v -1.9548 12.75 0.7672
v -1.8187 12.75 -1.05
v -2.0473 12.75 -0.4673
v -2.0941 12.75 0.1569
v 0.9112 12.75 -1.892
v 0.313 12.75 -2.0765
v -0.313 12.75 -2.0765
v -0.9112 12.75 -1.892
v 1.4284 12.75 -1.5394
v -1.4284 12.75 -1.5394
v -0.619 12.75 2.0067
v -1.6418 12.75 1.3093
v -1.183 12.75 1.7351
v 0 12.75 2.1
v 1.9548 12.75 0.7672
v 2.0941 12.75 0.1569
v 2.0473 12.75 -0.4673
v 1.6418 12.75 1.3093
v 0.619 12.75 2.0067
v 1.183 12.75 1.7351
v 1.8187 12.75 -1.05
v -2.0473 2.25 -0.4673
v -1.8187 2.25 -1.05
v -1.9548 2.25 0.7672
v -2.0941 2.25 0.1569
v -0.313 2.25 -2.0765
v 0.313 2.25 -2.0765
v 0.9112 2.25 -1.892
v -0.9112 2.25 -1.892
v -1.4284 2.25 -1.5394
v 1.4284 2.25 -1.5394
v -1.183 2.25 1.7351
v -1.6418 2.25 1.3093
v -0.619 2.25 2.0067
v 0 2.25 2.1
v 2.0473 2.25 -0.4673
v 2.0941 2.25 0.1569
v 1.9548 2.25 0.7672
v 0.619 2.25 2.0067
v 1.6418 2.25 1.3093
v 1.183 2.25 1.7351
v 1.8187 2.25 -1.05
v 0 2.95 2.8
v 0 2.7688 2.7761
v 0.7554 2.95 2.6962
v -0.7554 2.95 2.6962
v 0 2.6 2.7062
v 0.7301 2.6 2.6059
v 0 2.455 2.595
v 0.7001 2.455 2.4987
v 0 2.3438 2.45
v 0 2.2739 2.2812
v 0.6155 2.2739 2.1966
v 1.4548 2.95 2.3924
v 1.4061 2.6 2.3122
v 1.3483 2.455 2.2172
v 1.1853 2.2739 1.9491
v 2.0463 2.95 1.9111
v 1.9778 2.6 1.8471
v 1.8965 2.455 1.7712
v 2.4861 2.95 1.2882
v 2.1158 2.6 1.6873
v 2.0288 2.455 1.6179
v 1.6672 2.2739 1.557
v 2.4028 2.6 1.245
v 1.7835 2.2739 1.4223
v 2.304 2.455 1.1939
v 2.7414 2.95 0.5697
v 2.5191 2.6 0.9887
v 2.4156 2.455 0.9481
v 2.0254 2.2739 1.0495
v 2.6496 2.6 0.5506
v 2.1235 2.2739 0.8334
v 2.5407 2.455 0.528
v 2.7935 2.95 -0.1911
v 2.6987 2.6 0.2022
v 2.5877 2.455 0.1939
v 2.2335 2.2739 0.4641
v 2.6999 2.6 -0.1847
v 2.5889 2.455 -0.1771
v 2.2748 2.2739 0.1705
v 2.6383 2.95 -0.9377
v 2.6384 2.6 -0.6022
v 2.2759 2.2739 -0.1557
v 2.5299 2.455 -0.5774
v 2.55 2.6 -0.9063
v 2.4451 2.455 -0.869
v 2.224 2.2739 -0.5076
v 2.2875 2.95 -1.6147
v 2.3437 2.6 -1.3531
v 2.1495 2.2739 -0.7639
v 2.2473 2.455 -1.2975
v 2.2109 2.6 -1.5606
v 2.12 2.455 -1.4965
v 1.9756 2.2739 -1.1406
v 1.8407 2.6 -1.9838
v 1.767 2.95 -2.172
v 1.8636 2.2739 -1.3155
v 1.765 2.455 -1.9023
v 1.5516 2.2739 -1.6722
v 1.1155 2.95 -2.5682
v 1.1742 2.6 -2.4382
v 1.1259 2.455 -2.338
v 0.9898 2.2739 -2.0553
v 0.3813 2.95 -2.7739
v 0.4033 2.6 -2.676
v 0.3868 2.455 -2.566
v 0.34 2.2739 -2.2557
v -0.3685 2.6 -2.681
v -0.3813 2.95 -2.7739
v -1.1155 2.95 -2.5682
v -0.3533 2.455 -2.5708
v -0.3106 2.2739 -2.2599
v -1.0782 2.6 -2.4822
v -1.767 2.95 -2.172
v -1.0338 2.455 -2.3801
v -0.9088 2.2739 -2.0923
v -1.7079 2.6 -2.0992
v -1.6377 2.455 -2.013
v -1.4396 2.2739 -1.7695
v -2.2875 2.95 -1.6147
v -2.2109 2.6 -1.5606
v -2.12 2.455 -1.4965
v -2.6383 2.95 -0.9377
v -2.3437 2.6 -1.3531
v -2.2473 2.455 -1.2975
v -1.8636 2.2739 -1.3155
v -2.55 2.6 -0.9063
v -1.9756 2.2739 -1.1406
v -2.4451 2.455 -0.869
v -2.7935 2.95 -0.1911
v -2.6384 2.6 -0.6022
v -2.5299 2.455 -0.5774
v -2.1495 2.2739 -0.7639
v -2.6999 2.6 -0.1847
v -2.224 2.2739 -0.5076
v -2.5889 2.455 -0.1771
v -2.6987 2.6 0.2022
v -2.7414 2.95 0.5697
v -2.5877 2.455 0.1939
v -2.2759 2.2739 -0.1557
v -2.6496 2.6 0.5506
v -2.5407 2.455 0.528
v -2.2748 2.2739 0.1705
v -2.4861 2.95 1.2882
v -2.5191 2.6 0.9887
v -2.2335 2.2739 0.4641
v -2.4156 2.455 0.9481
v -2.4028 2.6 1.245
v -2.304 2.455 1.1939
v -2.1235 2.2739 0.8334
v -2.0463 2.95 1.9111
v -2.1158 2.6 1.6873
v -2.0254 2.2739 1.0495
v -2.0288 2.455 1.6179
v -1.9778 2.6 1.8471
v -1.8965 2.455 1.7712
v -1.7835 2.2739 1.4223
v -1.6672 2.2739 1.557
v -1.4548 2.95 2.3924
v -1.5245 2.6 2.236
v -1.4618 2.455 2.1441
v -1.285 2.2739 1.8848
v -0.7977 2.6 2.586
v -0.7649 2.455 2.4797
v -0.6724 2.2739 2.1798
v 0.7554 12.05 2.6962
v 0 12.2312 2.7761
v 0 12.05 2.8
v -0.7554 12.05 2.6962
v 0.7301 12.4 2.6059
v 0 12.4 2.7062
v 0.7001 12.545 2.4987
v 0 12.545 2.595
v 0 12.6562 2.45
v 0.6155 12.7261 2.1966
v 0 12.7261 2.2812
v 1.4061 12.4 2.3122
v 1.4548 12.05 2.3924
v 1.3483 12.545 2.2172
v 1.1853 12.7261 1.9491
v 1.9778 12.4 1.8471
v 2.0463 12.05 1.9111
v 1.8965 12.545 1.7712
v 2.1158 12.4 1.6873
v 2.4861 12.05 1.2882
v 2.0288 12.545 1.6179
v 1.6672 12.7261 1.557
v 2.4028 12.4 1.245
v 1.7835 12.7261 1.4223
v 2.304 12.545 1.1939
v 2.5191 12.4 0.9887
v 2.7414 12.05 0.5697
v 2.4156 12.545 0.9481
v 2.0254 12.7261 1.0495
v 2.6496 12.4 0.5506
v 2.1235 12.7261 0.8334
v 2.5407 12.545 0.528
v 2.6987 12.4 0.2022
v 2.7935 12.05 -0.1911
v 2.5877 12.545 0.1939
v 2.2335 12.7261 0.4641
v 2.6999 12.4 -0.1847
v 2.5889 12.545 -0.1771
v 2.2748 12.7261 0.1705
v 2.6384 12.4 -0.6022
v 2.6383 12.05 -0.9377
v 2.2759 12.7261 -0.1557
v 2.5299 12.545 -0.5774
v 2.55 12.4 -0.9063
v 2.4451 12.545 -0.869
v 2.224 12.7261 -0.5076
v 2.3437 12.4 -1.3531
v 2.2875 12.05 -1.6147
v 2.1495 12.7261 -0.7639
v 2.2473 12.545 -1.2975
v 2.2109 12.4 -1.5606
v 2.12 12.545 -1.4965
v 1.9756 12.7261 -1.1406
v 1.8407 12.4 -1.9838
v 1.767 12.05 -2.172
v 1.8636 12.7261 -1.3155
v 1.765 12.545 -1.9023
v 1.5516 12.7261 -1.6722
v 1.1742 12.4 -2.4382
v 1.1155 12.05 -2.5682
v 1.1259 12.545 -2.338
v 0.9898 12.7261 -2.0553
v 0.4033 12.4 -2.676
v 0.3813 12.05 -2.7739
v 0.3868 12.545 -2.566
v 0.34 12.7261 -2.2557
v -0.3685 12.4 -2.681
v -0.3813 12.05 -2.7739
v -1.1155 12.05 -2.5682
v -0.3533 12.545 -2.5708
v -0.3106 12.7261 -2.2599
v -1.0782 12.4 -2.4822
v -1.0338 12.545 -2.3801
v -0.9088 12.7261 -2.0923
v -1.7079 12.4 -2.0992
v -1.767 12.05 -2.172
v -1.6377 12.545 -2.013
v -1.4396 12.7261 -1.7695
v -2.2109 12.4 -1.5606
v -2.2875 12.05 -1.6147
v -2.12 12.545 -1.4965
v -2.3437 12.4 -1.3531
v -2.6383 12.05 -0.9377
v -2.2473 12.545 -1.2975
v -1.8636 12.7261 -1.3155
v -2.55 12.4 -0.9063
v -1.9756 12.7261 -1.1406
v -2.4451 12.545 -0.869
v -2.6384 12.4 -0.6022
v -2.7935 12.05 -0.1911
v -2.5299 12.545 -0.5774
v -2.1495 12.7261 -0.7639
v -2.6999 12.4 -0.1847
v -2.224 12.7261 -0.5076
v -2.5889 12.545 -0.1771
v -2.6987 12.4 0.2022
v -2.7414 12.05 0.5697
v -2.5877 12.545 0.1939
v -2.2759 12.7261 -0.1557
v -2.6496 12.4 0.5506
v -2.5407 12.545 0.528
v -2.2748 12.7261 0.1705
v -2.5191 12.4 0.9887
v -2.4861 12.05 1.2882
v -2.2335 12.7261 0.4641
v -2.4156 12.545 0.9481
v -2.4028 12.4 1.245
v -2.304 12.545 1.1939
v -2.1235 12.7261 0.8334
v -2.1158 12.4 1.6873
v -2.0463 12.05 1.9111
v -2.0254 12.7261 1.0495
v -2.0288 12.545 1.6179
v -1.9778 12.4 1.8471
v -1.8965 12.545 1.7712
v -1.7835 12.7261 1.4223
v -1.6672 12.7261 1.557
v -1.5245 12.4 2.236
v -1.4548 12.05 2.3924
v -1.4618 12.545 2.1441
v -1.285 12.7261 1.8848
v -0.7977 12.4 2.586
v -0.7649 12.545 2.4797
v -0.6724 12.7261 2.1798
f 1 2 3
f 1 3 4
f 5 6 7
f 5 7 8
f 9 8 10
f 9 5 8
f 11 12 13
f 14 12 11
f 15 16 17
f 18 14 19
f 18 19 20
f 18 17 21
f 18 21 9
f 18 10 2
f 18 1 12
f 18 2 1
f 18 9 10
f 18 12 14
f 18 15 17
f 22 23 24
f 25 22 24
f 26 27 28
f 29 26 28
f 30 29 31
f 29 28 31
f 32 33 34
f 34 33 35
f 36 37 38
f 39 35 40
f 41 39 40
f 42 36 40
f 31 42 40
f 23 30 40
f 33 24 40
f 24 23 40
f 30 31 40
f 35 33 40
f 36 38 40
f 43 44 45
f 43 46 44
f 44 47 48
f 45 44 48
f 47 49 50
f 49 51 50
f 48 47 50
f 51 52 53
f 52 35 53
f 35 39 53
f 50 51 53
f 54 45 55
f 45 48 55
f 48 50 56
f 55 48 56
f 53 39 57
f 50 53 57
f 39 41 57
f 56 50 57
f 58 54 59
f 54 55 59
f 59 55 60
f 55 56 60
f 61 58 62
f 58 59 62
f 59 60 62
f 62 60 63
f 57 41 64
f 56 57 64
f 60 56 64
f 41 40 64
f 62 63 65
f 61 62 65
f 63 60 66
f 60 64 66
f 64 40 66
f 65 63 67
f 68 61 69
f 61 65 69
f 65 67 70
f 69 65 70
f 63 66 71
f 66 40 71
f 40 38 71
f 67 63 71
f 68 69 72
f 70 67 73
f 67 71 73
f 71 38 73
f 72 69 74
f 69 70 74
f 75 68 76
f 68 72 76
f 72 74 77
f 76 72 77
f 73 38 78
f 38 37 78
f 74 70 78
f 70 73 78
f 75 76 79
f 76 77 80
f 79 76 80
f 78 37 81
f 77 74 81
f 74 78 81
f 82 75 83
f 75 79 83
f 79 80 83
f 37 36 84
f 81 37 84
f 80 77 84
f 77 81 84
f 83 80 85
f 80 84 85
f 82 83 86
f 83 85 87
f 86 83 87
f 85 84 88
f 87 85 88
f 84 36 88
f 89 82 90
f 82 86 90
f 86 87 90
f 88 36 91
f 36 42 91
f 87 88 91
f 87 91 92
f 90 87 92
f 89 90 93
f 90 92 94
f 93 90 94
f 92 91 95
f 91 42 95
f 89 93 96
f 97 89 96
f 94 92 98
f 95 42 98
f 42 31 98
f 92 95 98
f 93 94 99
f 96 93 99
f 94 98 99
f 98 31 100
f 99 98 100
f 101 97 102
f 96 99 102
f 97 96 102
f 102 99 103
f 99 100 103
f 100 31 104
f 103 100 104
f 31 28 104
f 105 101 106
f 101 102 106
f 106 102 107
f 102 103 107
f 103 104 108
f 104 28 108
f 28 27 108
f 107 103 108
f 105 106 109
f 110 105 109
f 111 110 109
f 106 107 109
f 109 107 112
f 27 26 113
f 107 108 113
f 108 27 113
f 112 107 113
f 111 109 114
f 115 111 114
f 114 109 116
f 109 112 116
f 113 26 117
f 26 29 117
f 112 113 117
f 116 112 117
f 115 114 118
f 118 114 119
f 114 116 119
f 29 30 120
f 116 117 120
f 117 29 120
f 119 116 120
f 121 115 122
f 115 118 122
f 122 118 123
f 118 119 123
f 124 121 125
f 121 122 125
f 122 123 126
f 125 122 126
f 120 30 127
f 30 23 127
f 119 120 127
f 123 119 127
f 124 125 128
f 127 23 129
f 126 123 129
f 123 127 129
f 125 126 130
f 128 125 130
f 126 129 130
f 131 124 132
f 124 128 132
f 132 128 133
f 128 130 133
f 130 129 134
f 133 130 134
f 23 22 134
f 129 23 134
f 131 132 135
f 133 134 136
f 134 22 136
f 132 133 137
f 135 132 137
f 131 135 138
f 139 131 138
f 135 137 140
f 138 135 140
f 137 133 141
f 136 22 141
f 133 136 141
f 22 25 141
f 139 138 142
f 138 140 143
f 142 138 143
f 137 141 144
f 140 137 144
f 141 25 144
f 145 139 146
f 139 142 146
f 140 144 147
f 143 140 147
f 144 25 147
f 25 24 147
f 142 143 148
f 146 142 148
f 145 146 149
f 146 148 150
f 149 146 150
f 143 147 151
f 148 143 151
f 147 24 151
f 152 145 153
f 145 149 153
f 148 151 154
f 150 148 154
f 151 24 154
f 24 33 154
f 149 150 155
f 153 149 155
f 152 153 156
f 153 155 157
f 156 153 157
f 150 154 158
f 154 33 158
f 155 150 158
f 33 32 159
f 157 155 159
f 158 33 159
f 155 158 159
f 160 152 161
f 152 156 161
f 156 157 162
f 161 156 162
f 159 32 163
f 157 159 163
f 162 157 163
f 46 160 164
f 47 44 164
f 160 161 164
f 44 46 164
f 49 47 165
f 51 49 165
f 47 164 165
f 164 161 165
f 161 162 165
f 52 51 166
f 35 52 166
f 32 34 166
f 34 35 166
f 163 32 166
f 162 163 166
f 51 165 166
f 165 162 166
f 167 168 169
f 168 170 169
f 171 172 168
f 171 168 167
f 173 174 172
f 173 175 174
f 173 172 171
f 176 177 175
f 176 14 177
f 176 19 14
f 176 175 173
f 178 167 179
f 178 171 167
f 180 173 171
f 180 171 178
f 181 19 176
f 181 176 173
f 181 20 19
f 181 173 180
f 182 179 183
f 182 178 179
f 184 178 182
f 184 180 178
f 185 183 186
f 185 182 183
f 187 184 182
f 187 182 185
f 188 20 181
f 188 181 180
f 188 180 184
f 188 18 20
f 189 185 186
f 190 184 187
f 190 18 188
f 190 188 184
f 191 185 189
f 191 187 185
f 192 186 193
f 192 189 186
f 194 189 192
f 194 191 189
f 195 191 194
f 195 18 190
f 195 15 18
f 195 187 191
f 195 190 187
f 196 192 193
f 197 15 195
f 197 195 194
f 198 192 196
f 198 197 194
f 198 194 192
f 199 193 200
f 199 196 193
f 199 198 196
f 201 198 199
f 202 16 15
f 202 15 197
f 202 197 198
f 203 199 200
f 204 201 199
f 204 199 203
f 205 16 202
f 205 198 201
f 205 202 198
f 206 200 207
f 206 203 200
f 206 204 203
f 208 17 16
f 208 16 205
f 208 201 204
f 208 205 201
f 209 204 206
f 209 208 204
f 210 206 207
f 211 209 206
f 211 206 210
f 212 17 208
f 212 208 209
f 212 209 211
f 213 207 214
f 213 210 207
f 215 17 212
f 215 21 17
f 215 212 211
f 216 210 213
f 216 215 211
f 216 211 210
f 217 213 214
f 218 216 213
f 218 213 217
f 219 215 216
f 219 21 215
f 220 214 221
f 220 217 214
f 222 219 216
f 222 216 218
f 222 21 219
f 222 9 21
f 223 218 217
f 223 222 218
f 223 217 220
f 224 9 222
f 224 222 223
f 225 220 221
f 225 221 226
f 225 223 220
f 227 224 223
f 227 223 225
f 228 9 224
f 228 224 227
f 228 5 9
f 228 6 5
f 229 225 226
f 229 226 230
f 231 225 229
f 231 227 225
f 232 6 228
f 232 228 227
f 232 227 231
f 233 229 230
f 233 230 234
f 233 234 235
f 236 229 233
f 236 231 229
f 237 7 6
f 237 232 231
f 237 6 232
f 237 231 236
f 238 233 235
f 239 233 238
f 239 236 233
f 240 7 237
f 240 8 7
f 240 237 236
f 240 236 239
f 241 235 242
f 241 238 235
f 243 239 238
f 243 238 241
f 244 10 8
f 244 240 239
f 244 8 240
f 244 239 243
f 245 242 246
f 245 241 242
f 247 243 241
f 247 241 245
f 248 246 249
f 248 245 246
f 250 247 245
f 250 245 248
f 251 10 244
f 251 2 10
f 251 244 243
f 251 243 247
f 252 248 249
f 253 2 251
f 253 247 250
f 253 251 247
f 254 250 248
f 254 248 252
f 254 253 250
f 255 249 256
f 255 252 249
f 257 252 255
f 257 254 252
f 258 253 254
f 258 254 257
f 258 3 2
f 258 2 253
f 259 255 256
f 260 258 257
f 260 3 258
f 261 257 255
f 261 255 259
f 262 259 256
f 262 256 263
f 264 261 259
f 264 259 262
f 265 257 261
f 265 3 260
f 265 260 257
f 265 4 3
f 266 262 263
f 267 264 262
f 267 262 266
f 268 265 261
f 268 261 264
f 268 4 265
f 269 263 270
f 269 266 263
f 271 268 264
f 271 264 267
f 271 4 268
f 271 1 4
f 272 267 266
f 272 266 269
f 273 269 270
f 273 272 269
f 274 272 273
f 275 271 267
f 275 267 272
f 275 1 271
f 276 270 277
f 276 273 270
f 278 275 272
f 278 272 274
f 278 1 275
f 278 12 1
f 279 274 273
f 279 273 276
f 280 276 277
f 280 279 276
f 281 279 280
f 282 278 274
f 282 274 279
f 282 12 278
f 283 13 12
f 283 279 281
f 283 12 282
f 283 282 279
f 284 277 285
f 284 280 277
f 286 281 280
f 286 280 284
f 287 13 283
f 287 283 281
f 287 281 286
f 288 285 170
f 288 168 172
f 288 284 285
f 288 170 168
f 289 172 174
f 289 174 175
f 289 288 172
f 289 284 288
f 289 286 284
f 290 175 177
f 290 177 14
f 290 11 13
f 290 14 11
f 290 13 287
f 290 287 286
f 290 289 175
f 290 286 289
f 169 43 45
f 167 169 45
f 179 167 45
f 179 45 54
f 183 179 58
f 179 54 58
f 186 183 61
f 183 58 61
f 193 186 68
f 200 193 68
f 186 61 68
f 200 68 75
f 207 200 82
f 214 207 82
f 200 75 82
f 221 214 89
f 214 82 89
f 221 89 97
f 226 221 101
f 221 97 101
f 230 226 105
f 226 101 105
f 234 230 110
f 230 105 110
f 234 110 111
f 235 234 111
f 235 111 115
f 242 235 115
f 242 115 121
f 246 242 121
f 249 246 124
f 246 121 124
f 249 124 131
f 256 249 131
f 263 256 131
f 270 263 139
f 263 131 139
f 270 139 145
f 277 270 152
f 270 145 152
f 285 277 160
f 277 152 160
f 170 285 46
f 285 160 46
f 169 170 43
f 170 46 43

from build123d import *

# Parameters (mm, degrees)
SKETCH1_R           = 4
BOSS_EXTRUDE1_DEPTH = 15
FILLET1_R           = 1
SCALE1_SCALE        = 0.7


with BuildPart() as part:
    # Sketch1 → Boss-Extrude1 (new body)
    with BuildSketch(Plane(origin=(0, 0, 0), x_dir=(1, 0, 0), z_dir=(0, 1, 0))):
        with Locations(Location((0, 0, 0), (0, 0, 270))):
            Circle(SKETCH1_R)
    extrude(amount=BOSS_EXTRUDE1_DEPTH)

    # Fillet1
    fillet1_edges = [part.edges().sort_by_distance(p)[0] for p in [
        (0, 0, -4),
        (0, 15, -4),
    ]]
    fillet(fillet1_edges, radius=FILLET1_R)


with BuildPart() as part_1:
    # Scale1: scaled about (0, 7.5, 0)
    add(part.part.scale(SCALE1_SCALE).moved(Location((0, 2.25, 0))))


solid = part_1.part
